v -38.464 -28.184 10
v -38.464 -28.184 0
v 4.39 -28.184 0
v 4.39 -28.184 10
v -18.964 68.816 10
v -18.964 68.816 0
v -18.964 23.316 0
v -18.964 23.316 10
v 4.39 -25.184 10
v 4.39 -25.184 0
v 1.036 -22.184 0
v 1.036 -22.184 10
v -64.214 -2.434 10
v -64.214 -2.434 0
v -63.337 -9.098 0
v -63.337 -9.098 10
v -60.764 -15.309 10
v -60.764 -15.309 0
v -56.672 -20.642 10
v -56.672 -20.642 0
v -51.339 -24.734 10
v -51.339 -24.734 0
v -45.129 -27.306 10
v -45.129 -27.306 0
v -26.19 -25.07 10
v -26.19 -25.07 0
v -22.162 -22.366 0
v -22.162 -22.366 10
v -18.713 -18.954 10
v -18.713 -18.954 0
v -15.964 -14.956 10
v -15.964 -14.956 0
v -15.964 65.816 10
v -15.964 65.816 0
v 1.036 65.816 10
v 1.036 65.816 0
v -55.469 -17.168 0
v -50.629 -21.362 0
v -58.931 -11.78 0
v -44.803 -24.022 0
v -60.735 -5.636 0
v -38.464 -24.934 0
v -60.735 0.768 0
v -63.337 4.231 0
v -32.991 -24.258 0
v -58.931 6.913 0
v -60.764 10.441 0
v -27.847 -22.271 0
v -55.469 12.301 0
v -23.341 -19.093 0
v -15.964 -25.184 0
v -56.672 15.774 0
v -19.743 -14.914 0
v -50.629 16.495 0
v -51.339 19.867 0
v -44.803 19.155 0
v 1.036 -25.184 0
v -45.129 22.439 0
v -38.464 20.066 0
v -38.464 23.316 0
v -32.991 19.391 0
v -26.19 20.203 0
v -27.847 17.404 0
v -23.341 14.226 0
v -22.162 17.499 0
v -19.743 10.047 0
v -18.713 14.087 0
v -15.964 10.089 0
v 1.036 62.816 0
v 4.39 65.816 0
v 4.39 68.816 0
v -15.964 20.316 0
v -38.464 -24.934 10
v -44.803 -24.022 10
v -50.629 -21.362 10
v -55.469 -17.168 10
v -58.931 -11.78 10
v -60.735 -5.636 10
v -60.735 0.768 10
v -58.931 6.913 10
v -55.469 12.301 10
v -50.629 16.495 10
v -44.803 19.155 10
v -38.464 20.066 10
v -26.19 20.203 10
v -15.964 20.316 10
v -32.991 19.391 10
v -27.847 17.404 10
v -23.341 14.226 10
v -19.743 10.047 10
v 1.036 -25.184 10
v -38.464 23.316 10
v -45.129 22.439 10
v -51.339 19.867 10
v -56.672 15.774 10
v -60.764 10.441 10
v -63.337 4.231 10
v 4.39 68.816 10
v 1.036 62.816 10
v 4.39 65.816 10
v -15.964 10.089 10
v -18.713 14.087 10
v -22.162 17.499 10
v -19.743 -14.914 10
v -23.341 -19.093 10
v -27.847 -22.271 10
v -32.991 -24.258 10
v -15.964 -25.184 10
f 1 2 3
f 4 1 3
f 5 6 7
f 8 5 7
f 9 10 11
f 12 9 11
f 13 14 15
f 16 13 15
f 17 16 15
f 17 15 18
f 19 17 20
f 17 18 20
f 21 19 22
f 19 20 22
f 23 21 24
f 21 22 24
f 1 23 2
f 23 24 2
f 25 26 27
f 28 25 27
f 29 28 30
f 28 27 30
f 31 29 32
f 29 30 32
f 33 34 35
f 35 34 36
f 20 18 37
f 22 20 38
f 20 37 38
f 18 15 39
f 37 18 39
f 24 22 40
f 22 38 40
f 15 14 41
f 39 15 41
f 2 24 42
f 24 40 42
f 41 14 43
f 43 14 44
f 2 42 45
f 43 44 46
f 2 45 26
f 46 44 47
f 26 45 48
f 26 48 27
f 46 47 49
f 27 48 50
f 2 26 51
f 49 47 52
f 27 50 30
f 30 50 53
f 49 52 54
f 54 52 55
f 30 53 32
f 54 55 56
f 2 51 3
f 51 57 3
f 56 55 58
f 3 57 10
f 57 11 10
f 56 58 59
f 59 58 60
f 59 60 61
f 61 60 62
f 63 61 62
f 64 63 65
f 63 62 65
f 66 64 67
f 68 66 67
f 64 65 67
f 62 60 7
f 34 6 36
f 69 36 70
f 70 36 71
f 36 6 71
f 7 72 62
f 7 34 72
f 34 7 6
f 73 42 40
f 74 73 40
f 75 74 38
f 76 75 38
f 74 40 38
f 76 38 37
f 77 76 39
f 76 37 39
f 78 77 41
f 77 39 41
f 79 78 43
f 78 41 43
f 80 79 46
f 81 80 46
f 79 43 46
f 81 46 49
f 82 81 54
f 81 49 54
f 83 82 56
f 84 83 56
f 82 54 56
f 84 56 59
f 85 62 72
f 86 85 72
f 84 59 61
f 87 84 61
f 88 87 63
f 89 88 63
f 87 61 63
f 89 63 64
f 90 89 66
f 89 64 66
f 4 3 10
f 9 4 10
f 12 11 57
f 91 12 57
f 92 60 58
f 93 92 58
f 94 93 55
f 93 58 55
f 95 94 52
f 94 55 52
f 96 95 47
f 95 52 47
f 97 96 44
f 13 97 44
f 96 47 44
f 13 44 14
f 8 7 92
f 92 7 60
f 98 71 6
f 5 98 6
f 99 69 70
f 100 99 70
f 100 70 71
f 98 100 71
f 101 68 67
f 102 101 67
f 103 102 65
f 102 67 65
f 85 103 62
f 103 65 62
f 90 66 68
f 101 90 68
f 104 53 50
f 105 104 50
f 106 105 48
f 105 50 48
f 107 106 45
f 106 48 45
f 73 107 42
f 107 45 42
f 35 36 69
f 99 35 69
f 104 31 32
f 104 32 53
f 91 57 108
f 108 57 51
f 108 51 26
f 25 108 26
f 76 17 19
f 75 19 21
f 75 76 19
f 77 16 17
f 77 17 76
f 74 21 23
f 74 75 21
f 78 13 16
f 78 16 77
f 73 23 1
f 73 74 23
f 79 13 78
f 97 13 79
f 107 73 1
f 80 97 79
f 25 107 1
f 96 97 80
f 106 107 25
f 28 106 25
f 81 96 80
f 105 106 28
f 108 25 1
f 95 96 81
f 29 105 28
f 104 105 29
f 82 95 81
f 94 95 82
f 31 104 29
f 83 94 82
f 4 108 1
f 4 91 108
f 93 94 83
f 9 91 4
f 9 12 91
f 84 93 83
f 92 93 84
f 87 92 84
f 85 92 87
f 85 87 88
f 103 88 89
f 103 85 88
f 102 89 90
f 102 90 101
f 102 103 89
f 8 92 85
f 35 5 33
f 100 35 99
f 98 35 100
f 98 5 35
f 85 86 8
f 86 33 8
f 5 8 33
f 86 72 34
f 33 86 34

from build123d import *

# Parameters (mm, degrees)
F1_DEPTH = 10


# Not quite as in the source:
# - a feature names something its author has since deleted; it is built from what else it names


with BuildPart() as f1:
    # F0 (on Top) → F1 (new body)
    with BuildSketch(Plane.XY):
        with BuildLine():
            Line((-18.9642689968, 23.316359701), (-38.4642689968, 23.316359701))
            ThreePointArc((-38.4642689968, 23.316359701), (-56.6722686123, 15.7743593166), (-64.2142689968, -2.433640299))
            ThreePointArc((-64.2142689968, -2.433640299), (-56.6722686123, -20.6416399145), (-38.4642689968, -28.183640299))
            Line((-38.4642689968, -28.183640299), (4.3898329695, -28.183640299))
            Line((4.3898329695, -28.183640299), (4.3898329695, -25.183640299))
            Line((4.3898329695, -25.183640299), (1.0357310032, -22.183640299))
            Line((1.0357310032, -22.183640299), (1.0357310032, -25.183640299))
            Line((1.0357310032, -25.183640299), (-15.9642689968, -25.183640299))
            Line((-15.9642689968, -25.183640299), (-26.1900364695, -25.0700206604))
            Line((-26.1900364695, -25.0700206604), (-38.4642689968, -24.933640299))
            ThreePointArc((-38.4642689968, -24.933640299), (-54.3741715735, -18.3435428757), (-60.9642689968, -2.433640299))
            ThreePointArc((-60.9642689968, -2.433640299), (-54.3741715735, 13.4762622777), (-38.4642689968, 20.066359701))
            ThreePointArc((-38.4642689968, 20.066359701), (-27.8473278519, 17.4039644135), (-19.7429639579, 10.0468539878))
            Line((-19.7429639579, 10.0468539878), (-15.9642689968, 10.0888394874))
            ThreePointArc((-15.9642689968, 10.0888394874), (-20.3566861052, 15.8742252736), (-26.1900364695, 20.2027400624))
            Line((-26.1900364695, 20.2027400624), (-15.9642689968, 20.316359701))
            Line((-15.9642689968, 20.316359701), (-15.9642689968, 65.816359701))
            Line((-15.9642689968, 65.816359701), (1.0357310032, 65.816359701))
            Line((1.0357310032, 65.816359701), (1.0357310032, 62.816359701))
            Line((1.0357310032, 62.816359701), (4.3898329695, 65.816359701))
            Line((4.3898329695, 65.816359701), (4.3898329695, 68.816359701))
            Line((4.3898329695, 68.816359701), (-15.9642689968, 68.816359701))
            Line((-15.9642689968, 68.816359701), (-18.9642689968, 68.816359701))
            Line((-18.9642689968, 68.816359701), (-18.9642689968, 23.316359701))
        make_face()
        with BuildLine():
            Line((-38.4642689968, -24.933640299), (-26.1900364695, -25.0700206604))
            ThreePointArc((-26.1900364695, -25.0700206604), (-20.3566861052, -20.7415058716), (-15.9642689968, -14.9561200853))
            Line((-15.9642689968, -14.9561200853), (-19.7429639579, -14.9141345858))
            ThreePointArc((-19.7429639579, -14.9141345858), (-27.8473278519, -22.2712450114), (-38.4642689968, -24.933640299))
        make_face()
    extrude(amount=F1_DEPTH)


solid = f1.part
